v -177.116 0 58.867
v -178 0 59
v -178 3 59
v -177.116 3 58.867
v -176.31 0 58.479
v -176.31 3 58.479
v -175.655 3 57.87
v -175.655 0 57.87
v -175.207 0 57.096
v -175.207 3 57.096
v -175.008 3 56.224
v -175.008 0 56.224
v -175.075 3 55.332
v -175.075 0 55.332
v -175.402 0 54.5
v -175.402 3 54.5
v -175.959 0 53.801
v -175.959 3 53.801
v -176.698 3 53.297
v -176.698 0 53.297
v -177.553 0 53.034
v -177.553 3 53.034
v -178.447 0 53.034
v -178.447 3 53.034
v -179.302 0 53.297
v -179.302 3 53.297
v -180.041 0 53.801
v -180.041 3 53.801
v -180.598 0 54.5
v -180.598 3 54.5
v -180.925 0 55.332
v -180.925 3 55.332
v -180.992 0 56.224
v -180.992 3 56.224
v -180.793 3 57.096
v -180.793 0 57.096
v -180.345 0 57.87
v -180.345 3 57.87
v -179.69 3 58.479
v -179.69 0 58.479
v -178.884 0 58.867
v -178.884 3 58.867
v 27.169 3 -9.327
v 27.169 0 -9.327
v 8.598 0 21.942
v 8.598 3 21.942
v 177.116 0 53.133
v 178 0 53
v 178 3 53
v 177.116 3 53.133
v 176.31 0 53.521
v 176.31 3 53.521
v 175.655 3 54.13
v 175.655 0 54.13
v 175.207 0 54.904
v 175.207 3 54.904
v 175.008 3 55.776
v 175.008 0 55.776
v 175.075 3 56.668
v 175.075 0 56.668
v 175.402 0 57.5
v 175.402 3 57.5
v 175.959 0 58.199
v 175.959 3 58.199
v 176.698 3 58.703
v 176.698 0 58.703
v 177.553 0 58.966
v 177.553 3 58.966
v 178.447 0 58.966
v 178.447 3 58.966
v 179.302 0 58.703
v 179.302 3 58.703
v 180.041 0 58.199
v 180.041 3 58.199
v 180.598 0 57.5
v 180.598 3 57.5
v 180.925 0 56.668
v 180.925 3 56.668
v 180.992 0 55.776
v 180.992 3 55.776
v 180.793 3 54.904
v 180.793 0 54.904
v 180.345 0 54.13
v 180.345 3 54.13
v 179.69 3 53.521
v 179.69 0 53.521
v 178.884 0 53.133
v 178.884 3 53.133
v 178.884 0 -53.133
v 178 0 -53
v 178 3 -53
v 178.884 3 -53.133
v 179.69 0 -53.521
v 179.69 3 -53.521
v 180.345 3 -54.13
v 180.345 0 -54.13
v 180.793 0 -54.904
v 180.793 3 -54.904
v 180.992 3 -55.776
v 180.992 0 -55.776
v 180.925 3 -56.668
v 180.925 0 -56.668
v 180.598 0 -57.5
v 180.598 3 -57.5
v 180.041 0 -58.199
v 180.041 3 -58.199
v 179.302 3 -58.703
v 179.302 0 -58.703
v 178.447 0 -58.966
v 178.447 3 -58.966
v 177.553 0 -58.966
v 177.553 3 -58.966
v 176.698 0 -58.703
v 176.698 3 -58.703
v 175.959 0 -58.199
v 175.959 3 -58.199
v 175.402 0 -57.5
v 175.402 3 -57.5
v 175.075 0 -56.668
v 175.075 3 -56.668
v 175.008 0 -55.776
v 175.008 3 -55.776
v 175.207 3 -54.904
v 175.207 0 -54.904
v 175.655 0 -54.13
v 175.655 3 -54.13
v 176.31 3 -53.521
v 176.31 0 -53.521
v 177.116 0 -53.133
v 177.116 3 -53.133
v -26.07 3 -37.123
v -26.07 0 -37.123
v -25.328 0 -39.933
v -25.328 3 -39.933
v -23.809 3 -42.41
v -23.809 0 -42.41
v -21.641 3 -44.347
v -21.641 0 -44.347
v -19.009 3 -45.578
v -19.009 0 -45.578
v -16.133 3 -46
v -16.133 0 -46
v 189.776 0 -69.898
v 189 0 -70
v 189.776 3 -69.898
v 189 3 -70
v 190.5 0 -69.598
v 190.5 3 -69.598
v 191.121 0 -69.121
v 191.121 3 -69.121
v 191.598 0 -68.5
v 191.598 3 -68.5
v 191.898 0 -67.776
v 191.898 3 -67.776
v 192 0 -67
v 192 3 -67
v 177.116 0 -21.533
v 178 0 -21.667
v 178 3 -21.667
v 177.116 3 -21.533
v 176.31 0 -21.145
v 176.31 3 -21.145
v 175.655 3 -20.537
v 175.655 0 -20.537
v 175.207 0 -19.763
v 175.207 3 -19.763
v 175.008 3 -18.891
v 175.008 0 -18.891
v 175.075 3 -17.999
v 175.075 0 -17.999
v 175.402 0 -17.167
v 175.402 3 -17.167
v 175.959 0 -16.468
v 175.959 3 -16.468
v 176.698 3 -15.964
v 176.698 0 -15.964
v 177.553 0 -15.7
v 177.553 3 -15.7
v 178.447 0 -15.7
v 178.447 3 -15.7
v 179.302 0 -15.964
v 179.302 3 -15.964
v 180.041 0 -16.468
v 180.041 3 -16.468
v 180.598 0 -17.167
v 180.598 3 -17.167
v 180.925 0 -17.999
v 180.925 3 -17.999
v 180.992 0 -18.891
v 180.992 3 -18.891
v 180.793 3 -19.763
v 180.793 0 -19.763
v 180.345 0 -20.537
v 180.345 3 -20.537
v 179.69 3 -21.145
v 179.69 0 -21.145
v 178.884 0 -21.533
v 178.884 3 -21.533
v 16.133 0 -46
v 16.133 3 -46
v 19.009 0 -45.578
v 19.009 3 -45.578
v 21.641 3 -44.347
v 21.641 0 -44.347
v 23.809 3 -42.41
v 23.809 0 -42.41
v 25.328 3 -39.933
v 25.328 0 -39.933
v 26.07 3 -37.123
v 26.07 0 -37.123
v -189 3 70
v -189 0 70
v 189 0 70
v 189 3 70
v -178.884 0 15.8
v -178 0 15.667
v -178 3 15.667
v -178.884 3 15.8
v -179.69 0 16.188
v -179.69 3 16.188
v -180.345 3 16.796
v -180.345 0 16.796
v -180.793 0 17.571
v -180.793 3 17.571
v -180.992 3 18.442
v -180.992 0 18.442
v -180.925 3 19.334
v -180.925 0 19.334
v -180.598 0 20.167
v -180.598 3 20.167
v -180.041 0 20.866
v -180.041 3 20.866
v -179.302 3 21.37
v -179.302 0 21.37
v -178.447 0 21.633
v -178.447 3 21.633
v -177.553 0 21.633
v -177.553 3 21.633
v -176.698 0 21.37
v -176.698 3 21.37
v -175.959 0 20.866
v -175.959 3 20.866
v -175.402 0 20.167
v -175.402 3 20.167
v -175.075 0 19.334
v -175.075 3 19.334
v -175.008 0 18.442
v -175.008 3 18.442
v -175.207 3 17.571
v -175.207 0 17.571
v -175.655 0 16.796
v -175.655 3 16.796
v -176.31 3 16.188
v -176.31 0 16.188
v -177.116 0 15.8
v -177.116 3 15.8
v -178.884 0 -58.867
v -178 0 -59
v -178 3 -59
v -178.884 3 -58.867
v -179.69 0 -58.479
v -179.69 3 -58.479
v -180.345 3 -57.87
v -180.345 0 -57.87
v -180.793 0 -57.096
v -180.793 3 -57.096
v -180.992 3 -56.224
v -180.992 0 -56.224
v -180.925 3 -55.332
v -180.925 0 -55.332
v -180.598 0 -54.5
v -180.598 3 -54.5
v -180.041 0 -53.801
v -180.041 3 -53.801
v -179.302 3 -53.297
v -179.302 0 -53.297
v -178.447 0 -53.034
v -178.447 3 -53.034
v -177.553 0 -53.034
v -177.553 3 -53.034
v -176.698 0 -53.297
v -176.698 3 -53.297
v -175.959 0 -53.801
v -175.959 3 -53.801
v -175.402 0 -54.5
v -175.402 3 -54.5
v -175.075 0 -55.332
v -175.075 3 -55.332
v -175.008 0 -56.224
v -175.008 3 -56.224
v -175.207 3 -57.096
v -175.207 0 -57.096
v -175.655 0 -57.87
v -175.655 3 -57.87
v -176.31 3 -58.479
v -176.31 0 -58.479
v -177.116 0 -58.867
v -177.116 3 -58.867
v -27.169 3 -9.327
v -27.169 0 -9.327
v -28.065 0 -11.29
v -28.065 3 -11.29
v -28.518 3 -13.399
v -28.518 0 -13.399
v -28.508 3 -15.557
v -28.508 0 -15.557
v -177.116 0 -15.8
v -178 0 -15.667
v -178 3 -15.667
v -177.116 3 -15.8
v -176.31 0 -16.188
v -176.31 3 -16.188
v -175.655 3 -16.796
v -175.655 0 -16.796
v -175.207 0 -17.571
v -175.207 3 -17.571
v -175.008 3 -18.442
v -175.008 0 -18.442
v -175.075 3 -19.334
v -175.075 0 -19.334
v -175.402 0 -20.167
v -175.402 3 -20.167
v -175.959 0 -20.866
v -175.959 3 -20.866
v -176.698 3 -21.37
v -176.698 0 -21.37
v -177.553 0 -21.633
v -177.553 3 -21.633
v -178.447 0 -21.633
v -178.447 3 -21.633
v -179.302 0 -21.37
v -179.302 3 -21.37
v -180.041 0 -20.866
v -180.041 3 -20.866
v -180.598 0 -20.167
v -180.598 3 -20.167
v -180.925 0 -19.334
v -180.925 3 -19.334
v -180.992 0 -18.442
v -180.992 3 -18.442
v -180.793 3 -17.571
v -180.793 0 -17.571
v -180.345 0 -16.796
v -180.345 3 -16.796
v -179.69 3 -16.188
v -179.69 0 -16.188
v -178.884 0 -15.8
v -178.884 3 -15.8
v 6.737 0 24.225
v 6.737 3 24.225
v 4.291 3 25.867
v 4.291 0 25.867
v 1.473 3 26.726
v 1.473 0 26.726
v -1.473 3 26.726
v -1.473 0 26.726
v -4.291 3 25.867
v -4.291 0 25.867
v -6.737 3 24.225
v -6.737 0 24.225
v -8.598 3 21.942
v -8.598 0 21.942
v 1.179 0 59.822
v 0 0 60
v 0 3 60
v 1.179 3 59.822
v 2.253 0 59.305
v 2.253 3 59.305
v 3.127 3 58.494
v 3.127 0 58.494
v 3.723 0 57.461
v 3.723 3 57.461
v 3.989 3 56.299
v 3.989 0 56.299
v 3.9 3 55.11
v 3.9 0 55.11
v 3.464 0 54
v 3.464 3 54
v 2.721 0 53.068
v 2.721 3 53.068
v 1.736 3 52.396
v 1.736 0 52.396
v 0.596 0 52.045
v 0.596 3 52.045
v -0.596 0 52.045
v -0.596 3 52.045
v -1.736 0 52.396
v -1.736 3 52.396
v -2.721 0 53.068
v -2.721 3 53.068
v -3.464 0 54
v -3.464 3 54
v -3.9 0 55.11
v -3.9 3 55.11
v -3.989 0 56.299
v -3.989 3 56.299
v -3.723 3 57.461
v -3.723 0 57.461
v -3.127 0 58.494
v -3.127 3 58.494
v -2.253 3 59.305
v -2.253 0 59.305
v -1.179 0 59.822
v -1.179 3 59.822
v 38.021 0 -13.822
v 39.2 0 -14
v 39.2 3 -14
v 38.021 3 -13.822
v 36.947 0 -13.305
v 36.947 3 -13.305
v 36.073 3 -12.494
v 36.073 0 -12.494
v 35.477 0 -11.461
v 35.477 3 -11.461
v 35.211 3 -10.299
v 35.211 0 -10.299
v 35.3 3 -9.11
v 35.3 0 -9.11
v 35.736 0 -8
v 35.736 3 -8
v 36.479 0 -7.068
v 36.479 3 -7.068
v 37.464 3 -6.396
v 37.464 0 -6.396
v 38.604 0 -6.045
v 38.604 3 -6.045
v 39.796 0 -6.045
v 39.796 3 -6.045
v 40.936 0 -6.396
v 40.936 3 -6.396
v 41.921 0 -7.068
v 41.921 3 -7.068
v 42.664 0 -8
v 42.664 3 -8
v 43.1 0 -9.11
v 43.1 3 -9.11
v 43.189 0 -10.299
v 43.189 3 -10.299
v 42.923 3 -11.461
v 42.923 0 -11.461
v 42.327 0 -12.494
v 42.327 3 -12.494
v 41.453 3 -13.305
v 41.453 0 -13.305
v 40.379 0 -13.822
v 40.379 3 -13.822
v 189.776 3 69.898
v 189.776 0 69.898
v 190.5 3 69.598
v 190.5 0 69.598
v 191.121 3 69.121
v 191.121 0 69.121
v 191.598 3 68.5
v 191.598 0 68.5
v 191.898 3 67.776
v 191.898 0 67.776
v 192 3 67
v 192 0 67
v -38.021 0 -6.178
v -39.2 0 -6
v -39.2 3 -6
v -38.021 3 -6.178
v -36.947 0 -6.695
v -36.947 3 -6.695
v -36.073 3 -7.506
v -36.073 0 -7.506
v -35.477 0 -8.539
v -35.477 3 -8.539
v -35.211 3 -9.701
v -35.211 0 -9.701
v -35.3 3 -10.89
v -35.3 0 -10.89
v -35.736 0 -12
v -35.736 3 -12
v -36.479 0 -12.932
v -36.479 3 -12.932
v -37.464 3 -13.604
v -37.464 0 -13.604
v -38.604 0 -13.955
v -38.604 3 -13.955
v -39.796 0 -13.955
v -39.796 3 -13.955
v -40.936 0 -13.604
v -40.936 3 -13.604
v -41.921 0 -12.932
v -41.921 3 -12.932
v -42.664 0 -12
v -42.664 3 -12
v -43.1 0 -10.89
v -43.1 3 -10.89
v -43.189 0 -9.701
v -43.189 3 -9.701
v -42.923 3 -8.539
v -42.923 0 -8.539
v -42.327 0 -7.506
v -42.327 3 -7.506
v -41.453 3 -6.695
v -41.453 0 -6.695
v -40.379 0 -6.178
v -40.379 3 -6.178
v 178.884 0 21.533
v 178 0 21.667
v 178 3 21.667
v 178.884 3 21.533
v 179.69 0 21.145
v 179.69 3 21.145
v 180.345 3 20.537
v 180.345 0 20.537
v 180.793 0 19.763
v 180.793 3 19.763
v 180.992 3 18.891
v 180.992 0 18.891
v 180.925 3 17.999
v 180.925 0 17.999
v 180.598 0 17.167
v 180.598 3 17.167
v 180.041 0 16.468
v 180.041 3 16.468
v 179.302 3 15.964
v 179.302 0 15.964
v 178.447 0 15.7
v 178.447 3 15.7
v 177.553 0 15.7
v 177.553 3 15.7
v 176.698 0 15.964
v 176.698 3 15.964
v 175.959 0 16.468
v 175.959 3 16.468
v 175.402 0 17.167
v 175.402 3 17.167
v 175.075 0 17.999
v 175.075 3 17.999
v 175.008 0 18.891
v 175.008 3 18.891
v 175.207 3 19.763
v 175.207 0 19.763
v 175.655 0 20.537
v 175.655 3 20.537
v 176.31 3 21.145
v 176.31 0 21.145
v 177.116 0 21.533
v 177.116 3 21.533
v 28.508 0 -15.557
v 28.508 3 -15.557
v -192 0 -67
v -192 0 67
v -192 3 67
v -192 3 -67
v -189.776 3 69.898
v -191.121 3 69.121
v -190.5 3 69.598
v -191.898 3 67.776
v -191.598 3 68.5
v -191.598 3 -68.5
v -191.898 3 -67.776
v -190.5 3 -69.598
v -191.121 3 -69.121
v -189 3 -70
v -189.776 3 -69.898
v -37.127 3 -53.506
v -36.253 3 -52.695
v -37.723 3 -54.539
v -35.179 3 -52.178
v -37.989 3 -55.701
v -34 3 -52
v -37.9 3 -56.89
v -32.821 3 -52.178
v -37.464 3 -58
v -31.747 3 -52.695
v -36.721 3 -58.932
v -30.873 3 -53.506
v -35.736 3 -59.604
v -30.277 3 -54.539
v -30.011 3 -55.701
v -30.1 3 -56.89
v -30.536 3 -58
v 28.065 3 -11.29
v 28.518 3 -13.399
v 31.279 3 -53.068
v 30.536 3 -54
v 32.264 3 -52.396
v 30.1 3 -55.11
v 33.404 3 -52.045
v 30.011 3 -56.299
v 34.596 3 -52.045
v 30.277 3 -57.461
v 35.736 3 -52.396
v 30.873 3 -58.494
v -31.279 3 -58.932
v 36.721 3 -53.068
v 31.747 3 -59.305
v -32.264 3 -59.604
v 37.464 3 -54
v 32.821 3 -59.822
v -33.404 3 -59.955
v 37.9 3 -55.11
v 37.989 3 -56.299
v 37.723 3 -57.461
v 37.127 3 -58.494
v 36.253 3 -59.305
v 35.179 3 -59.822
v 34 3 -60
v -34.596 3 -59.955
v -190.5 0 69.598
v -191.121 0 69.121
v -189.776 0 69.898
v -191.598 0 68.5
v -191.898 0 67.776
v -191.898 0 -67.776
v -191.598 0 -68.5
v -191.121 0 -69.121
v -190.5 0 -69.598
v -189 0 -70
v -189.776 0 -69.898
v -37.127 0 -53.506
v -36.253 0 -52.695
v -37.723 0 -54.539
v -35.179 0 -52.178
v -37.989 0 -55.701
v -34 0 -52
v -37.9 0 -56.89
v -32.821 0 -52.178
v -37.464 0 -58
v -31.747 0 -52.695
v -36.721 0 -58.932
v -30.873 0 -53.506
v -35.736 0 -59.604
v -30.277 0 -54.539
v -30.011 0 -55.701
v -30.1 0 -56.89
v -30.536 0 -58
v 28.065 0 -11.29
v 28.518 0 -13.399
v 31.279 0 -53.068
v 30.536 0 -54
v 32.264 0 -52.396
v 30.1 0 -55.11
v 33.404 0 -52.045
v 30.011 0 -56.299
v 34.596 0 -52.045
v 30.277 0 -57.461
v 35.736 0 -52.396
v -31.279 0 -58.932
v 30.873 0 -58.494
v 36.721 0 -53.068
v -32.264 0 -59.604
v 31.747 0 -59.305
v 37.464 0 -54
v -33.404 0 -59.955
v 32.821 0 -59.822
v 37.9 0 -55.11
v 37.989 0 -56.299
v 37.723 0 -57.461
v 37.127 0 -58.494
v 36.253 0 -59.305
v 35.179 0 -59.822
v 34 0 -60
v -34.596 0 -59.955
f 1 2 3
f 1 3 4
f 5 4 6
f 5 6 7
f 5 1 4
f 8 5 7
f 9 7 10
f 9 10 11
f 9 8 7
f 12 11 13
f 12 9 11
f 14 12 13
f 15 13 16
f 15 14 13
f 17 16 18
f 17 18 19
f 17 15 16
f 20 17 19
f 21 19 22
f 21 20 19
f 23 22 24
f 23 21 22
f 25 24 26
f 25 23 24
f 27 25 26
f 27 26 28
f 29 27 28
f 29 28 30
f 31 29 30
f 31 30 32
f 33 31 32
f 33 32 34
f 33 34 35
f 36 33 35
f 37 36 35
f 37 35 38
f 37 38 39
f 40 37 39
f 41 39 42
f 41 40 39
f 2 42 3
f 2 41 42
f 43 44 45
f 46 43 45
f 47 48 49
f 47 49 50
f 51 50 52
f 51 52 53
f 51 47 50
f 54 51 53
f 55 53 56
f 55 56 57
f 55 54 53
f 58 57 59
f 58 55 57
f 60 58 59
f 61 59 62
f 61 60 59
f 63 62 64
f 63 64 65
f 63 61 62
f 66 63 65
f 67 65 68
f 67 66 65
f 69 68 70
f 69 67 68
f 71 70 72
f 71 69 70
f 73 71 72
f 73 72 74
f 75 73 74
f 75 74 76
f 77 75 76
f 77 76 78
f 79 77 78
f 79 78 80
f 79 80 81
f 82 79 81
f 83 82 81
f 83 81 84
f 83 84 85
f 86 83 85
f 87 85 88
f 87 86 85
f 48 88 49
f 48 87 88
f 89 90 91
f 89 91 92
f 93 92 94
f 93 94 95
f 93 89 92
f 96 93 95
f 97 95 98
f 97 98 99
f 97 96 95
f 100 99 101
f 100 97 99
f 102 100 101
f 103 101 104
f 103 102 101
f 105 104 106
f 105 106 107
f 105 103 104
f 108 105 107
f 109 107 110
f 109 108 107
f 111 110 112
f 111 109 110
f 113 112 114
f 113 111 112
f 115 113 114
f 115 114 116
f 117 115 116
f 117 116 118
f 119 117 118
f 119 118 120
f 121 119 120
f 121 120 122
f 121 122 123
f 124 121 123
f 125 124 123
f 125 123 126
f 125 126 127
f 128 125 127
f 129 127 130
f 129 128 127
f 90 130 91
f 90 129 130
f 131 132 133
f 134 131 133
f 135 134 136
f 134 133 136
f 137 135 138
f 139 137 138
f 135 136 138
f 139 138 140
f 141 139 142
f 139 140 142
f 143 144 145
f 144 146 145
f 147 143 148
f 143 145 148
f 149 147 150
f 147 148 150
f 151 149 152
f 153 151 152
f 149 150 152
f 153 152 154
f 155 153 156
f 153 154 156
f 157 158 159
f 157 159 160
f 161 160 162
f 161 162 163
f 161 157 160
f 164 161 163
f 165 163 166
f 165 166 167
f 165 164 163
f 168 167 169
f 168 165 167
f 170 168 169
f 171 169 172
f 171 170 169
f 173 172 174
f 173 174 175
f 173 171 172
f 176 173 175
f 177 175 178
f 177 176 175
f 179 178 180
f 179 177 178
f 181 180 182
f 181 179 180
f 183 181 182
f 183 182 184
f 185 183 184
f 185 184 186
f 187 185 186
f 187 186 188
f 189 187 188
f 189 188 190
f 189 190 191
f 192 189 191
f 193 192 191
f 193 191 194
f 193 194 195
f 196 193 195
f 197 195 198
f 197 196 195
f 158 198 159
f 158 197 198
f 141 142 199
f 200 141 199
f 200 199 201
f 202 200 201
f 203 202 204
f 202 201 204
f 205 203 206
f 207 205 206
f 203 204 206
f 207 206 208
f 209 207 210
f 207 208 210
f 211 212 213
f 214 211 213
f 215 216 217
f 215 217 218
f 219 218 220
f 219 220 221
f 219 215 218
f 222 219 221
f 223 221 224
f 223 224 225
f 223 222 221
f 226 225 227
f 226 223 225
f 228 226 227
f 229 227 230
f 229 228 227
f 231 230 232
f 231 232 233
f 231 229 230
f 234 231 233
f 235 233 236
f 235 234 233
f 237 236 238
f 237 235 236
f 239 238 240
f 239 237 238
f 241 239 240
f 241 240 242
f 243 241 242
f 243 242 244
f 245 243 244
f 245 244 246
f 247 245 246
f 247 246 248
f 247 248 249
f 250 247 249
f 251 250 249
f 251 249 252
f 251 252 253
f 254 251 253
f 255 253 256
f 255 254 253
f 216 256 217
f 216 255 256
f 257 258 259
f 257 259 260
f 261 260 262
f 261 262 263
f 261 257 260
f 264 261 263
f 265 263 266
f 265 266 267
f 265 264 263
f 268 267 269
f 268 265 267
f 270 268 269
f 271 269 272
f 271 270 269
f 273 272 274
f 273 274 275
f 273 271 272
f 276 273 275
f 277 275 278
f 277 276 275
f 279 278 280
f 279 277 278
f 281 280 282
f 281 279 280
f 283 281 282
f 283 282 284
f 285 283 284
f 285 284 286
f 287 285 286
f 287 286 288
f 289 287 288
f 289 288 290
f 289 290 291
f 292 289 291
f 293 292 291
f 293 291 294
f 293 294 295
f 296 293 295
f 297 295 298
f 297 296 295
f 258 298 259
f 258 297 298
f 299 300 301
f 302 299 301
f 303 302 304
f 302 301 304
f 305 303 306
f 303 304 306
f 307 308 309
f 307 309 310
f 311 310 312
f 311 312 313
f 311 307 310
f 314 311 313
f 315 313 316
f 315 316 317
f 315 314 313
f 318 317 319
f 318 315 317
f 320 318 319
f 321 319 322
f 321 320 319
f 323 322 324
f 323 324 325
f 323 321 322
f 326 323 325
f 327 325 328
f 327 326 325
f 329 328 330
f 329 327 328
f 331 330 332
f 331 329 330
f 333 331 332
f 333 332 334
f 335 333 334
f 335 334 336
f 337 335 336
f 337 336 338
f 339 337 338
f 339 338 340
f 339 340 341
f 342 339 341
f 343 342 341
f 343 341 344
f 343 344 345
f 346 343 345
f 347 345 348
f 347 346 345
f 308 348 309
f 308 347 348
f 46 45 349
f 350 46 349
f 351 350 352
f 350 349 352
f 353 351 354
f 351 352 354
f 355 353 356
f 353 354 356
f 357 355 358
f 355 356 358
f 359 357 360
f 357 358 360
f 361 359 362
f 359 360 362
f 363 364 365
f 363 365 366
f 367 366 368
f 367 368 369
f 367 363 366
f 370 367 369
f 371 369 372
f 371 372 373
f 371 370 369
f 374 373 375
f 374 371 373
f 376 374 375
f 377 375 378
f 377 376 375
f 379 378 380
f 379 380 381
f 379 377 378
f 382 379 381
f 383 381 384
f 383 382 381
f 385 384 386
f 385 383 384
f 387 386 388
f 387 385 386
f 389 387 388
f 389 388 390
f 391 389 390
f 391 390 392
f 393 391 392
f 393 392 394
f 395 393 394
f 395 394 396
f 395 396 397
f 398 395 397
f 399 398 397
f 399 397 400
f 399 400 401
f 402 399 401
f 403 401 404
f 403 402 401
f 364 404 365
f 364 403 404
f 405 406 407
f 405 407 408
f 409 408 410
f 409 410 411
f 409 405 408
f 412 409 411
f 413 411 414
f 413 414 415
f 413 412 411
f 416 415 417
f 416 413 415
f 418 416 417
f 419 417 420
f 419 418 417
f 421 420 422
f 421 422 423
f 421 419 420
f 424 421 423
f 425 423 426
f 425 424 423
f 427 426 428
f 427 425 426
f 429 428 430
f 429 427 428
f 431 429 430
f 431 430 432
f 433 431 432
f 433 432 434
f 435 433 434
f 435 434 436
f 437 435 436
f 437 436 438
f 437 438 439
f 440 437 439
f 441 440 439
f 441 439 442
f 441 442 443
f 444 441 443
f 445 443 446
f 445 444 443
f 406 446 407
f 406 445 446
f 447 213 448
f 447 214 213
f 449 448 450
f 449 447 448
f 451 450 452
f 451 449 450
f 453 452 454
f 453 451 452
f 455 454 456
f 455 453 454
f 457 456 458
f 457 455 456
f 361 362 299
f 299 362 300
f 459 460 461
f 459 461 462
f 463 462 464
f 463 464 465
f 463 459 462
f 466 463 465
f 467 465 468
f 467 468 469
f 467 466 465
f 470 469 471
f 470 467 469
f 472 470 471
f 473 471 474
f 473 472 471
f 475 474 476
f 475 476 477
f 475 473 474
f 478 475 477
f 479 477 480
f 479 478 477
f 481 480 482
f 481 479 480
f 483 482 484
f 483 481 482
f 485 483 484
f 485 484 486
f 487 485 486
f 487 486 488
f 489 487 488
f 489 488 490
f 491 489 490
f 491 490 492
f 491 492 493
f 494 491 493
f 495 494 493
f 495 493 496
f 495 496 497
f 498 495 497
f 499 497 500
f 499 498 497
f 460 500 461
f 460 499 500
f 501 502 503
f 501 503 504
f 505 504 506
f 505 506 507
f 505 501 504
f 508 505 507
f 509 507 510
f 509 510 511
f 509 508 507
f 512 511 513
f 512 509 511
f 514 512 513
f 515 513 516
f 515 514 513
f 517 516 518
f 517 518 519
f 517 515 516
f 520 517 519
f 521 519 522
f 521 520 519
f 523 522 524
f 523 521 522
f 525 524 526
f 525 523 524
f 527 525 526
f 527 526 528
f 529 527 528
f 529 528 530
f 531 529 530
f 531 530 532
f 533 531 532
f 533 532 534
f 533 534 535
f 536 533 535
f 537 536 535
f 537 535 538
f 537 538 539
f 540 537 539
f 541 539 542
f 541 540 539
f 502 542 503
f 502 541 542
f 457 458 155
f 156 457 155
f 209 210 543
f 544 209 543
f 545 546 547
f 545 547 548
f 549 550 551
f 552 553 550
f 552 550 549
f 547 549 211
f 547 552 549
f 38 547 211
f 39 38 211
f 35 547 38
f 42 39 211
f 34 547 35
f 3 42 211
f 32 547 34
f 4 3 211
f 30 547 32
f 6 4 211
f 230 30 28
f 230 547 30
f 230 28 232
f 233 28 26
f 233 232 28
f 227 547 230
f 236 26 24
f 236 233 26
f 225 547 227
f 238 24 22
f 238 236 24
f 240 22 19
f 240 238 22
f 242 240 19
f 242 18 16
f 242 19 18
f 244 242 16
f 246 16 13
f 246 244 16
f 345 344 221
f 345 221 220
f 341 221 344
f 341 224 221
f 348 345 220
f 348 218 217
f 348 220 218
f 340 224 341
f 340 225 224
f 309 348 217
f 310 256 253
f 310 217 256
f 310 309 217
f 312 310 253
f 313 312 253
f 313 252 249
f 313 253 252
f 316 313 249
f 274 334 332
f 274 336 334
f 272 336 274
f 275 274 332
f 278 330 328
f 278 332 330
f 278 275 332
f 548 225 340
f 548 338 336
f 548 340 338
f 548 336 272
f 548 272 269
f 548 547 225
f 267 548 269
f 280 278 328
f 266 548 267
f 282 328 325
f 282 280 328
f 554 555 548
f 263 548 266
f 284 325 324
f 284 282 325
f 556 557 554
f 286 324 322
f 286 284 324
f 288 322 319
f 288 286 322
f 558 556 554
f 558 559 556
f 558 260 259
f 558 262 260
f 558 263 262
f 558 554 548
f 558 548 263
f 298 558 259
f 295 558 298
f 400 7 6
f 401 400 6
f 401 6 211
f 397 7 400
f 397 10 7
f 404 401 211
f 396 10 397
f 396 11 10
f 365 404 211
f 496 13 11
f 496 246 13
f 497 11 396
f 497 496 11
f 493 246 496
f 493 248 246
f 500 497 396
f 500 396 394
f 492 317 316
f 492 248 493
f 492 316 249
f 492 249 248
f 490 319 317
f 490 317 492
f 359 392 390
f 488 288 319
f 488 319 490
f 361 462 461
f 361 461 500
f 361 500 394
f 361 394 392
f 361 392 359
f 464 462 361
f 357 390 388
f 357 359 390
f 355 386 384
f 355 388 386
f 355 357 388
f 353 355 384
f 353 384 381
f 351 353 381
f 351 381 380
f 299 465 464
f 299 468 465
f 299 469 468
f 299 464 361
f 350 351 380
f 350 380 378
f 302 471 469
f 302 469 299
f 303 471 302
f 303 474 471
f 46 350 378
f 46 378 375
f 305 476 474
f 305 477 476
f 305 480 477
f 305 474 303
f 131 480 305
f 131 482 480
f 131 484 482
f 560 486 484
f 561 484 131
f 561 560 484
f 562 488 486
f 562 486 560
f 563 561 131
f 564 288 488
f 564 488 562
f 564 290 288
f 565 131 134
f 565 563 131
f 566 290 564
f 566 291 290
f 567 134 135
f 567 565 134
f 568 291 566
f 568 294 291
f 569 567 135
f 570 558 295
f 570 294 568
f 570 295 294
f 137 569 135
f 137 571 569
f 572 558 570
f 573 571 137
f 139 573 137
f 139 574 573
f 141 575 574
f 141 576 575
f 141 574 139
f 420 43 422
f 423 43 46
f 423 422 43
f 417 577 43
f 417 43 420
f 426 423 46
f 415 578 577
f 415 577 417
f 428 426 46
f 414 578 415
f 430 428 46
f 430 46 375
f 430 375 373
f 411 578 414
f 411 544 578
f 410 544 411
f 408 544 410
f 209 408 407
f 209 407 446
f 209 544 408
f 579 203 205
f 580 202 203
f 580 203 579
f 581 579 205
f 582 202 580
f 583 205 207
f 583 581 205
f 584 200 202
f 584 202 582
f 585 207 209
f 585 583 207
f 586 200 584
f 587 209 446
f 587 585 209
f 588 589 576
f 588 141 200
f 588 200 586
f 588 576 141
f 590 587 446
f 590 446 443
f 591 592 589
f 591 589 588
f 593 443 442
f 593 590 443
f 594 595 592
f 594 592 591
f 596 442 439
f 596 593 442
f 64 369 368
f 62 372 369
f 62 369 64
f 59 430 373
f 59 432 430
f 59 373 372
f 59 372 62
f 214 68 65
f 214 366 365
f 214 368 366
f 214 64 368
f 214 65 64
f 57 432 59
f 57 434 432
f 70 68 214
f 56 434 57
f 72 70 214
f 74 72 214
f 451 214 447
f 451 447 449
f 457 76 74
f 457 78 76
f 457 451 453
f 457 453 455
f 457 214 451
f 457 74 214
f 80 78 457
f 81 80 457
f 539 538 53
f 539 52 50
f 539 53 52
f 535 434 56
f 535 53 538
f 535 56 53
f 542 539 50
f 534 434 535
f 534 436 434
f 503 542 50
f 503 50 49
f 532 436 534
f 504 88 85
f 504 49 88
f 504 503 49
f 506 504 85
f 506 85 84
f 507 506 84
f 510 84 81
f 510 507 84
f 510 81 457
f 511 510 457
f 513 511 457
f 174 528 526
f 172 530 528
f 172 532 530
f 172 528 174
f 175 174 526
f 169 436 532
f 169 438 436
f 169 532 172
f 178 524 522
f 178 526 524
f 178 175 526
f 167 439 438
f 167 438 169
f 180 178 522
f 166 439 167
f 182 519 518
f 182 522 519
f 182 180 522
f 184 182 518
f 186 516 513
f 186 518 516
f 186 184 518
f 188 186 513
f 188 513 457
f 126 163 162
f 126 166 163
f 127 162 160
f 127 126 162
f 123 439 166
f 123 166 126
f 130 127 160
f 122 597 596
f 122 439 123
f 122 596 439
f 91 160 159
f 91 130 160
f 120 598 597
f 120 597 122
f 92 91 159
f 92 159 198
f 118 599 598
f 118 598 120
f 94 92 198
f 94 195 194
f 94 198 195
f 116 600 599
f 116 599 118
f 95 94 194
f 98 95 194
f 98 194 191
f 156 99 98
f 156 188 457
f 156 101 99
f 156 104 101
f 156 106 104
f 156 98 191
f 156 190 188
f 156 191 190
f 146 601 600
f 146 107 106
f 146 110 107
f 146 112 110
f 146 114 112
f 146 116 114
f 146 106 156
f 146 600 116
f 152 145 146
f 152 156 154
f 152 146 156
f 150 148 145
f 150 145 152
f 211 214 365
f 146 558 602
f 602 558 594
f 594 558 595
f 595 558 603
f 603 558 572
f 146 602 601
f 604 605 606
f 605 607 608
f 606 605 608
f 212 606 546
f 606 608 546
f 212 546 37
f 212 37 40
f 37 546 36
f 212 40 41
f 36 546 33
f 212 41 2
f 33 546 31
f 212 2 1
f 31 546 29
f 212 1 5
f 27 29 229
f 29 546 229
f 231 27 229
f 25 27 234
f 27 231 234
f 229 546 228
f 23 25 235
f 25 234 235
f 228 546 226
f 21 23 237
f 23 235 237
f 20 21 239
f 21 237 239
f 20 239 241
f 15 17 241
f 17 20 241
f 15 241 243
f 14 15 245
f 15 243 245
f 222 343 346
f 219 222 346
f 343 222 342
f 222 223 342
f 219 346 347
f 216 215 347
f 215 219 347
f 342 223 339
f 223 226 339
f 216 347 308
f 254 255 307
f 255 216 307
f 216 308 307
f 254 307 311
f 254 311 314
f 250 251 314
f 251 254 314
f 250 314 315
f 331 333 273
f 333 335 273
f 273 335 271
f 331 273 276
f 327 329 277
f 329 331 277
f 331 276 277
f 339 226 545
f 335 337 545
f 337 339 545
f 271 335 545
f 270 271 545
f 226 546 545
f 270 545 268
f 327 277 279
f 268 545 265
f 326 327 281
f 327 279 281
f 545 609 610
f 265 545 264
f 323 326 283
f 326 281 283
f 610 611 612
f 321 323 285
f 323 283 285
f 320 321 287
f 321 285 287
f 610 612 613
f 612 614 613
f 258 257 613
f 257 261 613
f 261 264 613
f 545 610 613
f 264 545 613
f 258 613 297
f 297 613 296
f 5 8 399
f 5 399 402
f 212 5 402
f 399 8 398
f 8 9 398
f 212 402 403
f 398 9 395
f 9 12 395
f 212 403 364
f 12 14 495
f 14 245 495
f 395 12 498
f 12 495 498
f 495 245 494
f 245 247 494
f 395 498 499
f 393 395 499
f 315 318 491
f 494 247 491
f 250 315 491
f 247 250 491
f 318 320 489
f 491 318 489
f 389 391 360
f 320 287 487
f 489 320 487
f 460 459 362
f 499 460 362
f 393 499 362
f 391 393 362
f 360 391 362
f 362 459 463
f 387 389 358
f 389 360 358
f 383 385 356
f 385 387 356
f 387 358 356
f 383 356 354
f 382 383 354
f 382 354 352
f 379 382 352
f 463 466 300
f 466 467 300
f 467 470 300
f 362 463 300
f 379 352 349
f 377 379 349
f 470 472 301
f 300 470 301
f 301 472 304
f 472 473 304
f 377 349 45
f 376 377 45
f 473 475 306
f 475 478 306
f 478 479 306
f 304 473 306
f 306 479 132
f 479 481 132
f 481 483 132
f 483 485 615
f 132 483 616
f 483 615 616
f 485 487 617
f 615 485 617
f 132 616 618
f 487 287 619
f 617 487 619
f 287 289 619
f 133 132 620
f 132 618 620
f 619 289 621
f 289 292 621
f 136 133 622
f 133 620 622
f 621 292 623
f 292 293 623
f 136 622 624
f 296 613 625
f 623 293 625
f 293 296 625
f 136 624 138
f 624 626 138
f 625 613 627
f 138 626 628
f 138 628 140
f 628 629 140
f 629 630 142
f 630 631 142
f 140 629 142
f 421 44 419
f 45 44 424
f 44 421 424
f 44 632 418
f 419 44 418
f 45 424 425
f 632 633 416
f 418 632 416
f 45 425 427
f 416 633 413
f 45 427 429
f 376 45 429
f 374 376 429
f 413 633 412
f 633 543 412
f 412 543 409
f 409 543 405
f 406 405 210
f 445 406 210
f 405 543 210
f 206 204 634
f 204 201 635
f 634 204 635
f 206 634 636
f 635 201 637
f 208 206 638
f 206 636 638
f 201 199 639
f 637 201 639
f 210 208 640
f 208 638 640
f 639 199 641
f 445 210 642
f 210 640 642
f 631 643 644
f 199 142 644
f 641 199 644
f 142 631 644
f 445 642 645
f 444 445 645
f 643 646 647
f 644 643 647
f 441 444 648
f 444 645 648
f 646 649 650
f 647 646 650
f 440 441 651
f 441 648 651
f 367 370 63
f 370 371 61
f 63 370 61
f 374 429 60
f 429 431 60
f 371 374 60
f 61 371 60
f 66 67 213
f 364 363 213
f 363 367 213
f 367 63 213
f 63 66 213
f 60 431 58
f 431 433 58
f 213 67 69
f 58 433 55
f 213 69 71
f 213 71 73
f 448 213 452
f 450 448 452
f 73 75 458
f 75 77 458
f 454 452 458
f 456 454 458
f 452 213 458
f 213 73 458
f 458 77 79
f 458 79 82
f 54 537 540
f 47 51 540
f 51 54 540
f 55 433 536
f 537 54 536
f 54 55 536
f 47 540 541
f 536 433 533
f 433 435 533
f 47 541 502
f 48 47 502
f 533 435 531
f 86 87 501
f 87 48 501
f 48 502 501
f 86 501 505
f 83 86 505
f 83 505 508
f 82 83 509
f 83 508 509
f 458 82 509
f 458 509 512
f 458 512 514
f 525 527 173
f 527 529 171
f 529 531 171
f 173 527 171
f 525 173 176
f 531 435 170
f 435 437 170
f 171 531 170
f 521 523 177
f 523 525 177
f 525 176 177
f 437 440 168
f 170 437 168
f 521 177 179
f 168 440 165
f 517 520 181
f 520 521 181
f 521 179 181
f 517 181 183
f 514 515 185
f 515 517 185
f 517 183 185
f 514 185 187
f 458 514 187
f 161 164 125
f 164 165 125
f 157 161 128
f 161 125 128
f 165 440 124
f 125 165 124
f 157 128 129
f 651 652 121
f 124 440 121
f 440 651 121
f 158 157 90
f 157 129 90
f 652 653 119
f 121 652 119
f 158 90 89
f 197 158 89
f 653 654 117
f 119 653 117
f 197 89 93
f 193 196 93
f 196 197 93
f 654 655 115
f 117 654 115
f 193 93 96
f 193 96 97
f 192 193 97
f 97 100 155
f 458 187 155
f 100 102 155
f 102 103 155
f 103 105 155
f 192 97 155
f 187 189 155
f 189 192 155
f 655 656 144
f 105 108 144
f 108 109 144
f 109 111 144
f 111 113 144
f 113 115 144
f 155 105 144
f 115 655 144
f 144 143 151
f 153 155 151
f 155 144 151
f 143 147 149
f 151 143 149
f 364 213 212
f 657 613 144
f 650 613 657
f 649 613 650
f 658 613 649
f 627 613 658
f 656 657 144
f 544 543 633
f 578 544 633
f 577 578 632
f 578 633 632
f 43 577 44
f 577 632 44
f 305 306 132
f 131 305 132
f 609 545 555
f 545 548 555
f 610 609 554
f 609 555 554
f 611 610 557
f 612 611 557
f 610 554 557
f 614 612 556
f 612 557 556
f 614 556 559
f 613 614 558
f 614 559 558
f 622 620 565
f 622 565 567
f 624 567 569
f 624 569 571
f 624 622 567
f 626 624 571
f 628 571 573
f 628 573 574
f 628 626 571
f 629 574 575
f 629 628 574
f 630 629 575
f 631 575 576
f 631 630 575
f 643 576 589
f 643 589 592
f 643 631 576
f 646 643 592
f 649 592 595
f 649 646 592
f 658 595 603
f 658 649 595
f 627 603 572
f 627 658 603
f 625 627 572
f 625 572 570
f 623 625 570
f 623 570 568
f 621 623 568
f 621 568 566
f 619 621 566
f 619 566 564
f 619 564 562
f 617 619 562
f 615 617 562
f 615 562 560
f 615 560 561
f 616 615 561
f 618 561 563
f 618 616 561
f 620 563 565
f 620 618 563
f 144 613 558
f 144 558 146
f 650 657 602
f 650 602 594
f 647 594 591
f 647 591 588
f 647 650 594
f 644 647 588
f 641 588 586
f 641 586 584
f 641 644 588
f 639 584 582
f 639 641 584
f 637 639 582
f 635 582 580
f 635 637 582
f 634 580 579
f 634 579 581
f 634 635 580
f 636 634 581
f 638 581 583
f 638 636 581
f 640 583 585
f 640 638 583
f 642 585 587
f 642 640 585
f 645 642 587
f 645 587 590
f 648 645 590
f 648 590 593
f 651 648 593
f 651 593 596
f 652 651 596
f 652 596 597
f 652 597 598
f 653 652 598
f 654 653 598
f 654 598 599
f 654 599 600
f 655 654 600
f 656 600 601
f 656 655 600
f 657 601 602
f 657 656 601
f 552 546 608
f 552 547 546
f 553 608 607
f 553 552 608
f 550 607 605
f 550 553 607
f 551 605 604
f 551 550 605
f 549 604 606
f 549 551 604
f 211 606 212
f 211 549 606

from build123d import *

# Parameters (mm, degrees)
SKETCH1_W           = 384
SKETCH1_H           = 140
SKETCH1_R           = 4
SKETCH1_R_2         = 3
BOSS_EXTRUDE1_DEPTH = 3
FILLET1_R           = 3


with BuildPart() as part:
    # Sketch1 → Boss-Extrude1 (new body)
    with BuildSketch(Plane(origin=(0, 0, 0), x_dir=(1, 0, 0), z_dir=(0, 1, 0))):
        Rectangle(SKETCH1_W, SKETCH1_H)
        with Locations(Location((-34, 56, 0), (0, 0, 270))):
            Circle(SKETCH1_R, mode=Mode.SUBTRACT)
        with Locations(Location((-39.2, 10, 0), (0, 0, 270))):
            Circle(SKETCH1_R, mode=Mode.SUBTRACT)
        with Locations(Location((0, -56, 0), (0, 0, 270))):
            Circle(SKETCH1_R, mode=Mode.SUBTRACT)
        with Locations(Location((39.2, 10, 0), (0, 0, 90))):
            Circle(SKETCH1_R, mode=Mode.SUBTRACT)
        with Locations(Location((34, 56, 0), (0, 0, 90))):
            Circle(SKETCH1_R, mode=Mode.SUBTRACT)
        with Locations(Location((-178, -56, 0), (0, 0, 270))):
            Circle(SKETCH1_R_2, mode=Mode.SUBTRACT)
        with Locations(Location((178, -56, 0), (0, 0, 90))):
            Circle(SKETCH1_R_2, mode=Mode.SUBTRACT)
        with Locations(Location((-178, 56, 0), (0, 0, 90))):
            Circle(SKETCH1_R_2, mode=Mode.SUBTRACT)
        with Locations(Location((178, 56, 0), (0, 0, 270))):
            Circle(SKETCH1_R_2, mode=Mode.SUBTRACT)
        with Locations(Location((-178, 18.666666667, 0), (0, 0, 270))):
            Circle(SKETCH1_R_2, mode=Mode.SUBTRACT)
        with Locations(Location((-178, -18.666666667, 0), (0, 0, 90))):
            Circle(SKETCH1_R_2, mode=Mode.SUBTRACT)
        with Locations(Location((178, 18.666666667, 0), (0, 0, 90))):
            Circle(SKETCH1_R_2, mode=Mode.SUBTRACT)
        with Locations(Location((178, -18.666666667, 0), (0, 0, 270))):
            Circle(SKETCH1_R_2, mode=Mode.SUBTRACT)
        with BuildLine():
            Line((-28.508169209, 15.556618484), (-26.070198724, 37.123280462))
            ThreePointArc((-26.070198724, 37.123280462), (-22.795588541, 43.457640532), (-16.133486944, 46))
            Line((-16.133486944, 46), (16.133486944, 46))
            ThreePointArc((16.133486944, 46), (22.795588541, 43.457640532), (26.070198724, 37.123280462))
            Line((26.070198724, 37.123280462), (28.508169209, 15.556618484))
            ThreePointArc((28.508169209, 15.556618484), (28.348223714, 12.33218572), (27.169289942, 9.326746589))
            Line((27.169289942, 9.326746589), (8.597832514, -21.941523571))
            ThreePointArc((8.597832514, -21.941523571), (0, -26.834932138), (-8.597832514, -21.941523571))
            Line((-8.597832514, -21.941523571), (-27.169289942, 9.326746589))
            ThreePointArc((-27.169289942, 9.326746589), (-28.348223714, 12.33218572), (-28.508169209, 15.556618484))
        make_face(mode=Mode.SUBTRACT)
    extrude(amount=BOSS_EXTRUDE1_DEPTH)

    # Fillet1
    fillet1_edges = [part.edges().sort_by_distance(p)[0] for p in [
        (192, 1.5, 70),
        (-192, 1.5, 70),
        (-192, 1.5, -70),
        (192, 1.5, -70),
    ]]
    fillet(fillet1_edges, radius=FILLET1_R)


solid = part.part
